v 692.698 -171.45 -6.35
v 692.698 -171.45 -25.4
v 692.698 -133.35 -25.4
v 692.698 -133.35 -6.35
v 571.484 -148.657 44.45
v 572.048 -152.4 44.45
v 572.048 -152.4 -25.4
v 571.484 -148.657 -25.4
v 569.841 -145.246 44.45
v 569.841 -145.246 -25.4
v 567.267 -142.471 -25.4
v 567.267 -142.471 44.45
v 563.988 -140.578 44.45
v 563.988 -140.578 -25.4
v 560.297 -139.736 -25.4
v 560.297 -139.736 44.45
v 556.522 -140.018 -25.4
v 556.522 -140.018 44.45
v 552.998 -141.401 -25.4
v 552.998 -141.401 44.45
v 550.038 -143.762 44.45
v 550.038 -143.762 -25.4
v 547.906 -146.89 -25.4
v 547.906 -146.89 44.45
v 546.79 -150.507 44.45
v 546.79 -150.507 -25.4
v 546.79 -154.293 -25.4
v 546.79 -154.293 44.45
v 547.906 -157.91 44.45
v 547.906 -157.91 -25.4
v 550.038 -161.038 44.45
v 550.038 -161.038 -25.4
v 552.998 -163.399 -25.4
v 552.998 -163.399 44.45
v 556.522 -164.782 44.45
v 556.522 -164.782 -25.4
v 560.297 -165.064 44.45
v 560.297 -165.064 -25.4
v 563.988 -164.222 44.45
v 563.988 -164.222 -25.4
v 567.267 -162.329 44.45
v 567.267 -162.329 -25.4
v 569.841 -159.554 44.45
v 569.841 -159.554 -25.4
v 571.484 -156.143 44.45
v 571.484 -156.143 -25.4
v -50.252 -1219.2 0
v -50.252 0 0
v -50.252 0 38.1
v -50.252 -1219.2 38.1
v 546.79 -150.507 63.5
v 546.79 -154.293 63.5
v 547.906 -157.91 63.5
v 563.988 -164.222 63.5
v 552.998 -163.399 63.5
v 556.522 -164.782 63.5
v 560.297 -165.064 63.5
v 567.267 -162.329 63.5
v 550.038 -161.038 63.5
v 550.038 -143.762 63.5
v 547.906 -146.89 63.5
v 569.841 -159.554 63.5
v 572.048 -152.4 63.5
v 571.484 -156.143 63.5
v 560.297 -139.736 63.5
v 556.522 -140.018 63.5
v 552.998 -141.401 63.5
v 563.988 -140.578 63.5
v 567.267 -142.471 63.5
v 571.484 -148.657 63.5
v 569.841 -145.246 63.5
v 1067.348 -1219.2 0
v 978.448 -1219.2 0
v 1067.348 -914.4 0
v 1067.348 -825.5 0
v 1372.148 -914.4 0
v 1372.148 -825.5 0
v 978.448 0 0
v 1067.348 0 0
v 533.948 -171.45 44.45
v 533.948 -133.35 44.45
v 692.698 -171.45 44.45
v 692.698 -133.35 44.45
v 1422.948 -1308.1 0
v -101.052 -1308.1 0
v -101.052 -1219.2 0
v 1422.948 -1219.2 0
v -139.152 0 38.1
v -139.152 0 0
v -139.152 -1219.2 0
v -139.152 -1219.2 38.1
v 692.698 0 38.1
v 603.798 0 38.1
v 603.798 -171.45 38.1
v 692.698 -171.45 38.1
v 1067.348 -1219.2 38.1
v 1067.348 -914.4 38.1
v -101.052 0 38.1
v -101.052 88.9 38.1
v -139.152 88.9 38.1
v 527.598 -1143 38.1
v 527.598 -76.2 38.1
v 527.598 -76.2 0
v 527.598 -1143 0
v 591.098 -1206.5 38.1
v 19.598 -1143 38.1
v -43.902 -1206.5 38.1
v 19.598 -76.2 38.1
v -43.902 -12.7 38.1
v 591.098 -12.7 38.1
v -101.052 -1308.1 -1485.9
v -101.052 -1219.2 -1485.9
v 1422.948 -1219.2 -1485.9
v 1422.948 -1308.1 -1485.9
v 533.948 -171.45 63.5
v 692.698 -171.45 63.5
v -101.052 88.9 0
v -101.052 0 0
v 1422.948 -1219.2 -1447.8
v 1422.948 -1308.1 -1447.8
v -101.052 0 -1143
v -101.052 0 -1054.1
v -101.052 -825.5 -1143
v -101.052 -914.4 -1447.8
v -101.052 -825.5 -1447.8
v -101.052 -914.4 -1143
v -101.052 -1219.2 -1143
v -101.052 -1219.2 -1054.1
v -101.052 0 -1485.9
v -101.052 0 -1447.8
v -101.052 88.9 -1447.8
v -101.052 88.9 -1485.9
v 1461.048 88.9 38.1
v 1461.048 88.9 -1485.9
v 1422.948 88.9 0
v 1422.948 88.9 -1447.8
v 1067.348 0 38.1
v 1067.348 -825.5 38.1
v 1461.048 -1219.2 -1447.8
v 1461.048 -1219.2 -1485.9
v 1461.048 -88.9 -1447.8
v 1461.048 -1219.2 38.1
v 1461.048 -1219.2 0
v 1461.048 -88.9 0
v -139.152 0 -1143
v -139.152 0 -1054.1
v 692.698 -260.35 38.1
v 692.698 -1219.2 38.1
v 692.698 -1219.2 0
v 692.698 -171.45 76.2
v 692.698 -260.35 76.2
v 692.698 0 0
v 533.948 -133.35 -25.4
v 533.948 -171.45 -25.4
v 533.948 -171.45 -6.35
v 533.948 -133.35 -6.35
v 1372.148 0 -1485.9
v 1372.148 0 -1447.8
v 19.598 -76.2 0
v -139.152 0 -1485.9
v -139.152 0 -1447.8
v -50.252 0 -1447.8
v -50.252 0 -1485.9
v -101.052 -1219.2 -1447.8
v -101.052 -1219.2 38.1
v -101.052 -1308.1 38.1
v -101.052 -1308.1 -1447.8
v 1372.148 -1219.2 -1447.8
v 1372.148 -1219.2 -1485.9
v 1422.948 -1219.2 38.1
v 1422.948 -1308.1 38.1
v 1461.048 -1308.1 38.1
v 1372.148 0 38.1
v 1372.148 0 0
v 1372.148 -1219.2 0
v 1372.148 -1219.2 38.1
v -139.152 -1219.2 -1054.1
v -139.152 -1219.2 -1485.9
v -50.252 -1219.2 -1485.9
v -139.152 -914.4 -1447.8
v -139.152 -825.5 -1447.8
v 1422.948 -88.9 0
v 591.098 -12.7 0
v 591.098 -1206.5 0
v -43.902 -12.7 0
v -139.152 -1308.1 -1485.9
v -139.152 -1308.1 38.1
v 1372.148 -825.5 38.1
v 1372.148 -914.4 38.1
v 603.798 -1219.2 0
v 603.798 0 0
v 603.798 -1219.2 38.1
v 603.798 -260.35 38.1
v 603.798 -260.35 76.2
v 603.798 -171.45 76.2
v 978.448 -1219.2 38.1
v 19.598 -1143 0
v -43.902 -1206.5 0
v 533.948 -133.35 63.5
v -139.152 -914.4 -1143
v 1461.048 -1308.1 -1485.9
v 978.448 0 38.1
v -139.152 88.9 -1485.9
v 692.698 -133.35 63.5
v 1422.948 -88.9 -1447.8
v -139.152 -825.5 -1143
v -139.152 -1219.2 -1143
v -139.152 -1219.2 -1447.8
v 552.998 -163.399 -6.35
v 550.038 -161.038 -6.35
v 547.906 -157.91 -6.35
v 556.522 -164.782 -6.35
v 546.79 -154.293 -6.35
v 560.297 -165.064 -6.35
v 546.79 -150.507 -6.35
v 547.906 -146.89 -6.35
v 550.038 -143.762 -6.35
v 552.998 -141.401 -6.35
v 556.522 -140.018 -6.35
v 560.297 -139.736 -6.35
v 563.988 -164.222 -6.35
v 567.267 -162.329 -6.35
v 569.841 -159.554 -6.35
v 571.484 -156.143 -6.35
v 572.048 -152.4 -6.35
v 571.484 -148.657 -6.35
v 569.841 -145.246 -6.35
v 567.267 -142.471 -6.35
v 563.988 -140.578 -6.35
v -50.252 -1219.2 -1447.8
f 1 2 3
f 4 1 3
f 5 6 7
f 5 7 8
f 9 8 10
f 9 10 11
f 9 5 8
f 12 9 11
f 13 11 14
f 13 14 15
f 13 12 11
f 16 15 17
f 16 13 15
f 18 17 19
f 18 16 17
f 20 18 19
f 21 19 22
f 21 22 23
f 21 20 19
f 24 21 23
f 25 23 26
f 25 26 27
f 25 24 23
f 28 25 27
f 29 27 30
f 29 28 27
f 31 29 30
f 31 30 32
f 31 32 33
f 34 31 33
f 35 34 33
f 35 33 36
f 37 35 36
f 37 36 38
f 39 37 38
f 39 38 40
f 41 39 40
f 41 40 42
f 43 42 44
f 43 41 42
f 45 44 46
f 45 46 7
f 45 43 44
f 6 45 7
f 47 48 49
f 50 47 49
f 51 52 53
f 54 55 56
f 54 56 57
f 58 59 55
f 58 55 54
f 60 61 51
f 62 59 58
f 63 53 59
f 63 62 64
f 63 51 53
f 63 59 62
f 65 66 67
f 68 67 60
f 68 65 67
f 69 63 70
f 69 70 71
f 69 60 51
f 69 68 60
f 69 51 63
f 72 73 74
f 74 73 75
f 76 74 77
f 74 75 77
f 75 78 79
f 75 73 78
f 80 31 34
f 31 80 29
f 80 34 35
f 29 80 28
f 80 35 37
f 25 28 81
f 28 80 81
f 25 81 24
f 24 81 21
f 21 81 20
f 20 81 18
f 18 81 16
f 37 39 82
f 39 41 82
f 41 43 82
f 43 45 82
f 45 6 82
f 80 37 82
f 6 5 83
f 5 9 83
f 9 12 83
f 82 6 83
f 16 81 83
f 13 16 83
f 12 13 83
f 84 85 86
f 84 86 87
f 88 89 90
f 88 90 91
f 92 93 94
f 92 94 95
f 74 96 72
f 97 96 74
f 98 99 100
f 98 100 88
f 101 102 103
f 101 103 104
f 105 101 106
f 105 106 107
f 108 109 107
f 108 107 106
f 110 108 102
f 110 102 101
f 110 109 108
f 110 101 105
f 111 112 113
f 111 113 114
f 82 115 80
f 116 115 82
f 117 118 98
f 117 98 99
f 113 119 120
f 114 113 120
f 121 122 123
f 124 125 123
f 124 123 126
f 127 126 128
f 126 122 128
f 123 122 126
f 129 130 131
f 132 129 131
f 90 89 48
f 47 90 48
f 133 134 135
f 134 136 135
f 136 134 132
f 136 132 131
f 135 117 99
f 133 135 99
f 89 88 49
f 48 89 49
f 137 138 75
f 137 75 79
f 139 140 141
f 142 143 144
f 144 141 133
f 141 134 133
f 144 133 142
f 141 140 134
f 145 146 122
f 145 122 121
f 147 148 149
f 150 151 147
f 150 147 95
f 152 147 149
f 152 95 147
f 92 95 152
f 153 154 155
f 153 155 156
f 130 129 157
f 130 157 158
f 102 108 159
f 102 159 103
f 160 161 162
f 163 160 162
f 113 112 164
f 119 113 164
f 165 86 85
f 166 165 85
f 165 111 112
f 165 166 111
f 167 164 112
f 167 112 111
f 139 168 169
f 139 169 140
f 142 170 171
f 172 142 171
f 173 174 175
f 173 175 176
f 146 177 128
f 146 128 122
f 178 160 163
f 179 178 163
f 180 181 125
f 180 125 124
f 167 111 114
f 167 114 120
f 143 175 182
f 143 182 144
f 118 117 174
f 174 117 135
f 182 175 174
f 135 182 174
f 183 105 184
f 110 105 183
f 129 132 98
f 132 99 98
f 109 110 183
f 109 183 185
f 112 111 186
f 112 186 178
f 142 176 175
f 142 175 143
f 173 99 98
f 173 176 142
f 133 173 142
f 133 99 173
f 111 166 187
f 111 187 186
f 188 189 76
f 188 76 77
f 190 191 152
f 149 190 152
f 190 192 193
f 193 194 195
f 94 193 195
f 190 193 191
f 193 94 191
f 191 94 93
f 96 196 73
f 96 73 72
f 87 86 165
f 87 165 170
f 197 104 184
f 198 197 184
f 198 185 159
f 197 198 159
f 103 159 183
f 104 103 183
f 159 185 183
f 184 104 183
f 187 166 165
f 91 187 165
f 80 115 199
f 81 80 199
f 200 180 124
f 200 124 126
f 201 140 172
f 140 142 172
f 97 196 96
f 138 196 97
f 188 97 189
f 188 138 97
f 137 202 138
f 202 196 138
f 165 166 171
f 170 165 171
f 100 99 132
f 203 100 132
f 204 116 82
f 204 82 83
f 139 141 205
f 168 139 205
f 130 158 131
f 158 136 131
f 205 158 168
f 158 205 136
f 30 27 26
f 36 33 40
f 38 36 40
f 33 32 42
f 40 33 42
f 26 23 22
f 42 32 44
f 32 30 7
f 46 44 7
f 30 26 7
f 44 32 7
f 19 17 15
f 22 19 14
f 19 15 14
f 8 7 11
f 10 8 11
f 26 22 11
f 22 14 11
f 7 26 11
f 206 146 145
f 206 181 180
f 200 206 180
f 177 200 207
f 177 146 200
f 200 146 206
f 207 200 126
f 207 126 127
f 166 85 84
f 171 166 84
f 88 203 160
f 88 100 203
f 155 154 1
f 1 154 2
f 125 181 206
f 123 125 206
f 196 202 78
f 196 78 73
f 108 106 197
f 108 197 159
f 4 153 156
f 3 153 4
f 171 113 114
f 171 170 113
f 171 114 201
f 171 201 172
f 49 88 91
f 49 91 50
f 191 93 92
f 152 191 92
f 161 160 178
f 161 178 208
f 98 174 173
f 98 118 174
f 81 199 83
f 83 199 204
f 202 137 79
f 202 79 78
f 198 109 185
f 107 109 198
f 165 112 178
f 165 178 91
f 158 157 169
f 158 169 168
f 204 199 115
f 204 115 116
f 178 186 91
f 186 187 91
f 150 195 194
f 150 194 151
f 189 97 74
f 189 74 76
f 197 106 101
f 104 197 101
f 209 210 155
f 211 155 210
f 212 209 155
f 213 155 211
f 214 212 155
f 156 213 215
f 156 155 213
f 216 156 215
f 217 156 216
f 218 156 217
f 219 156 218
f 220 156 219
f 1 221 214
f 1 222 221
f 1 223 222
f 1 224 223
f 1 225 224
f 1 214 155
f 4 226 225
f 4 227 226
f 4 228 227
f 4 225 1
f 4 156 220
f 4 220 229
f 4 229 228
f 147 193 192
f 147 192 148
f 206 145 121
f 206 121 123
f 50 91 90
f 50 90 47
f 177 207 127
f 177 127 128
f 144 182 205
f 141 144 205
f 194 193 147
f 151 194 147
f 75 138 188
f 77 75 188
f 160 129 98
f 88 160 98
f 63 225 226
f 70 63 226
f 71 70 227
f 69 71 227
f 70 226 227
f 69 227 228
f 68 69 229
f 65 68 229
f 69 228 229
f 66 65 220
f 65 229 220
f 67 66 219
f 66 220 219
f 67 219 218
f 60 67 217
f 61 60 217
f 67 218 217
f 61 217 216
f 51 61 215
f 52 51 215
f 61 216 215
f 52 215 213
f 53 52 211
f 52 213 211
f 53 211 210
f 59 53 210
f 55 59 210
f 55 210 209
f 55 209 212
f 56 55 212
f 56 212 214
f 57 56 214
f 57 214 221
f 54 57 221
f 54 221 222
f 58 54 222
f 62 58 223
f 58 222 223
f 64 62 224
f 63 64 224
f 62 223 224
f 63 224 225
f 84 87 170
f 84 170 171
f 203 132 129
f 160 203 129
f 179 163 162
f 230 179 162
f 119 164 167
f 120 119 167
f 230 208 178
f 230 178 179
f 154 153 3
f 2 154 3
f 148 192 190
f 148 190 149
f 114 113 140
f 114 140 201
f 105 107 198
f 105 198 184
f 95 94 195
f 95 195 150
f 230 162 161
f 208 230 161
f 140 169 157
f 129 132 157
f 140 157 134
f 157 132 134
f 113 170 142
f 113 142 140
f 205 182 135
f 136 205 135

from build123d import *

# Parameters (mm, degrees)
F0_W           = 1524
F0_H           = 88.9
F1_DEPTH       = 38.1
F2_W           = 88.9
F2_H           = 1485.9
F2_H_2         = 38.1
F3_DEPTH       = 38.1
F4_W           = 88.9
F4_H           = 1485.9
F4_H_2         = 38.1
F5_DEPTH       = 38.1
F6_W           = 88.9
F6_H           = 38.1
F7_DEPTH       = 1524
F8_W           = 88.9
F8_H           = 38.1
F9_DEPTH       = 1219.2
F8_W_2         = 50.8
F8_W_3         = 38.1
F12_DEPTH      = 88.9
F13_W          = 508
F13_H          = 63.5
F14_DEPTH      = 38.1
F15_W          = 88.9
F15_H          = 1219.2
F16_DEPTH      = 38.1
F17_R          = 12.7
F18_DEPTH      = 25.4
F18_DEPTH_BACK = 63.5
F19_W          = 158.75
F19_H          = 38.1
F19_R          = 12.7
F20_DEPTH      = 19.05
F23_W          = 88.9
F23_H          = 88.9
F24_DEPTH      = 38.1
F25_W          = 304.8
F25_H          = 88.9
F26_DEPTH      = 38.1
F27_W          = 88.9
F27_H          = 304.8
F28_DEPTH      = 38.1


with BuildPart() as f1:
    # F0 (on Top) → F1 (new body)
    with BuildSketch(Plane.XY):
        with Locations((660.9481970845, 44.45)):
            Rectangle(F0_W, F0_H)
    extrude(amount=F1_DEPTH)


with BuildPart() as f3:
    # F2 (on face) → F3 (new body)
    with BuildSketch(Plane.YZ.offset(1422.9481970845)):
        with Locations((44.45, -742.95)):
            Rectangle(F2_W, F2_H)
        with Locations((44.45, 19.05)):
            Rectangle(F2_W, F2_H_2)
    extrude(amount=F3_DEPTH)


with BuildPart() as f5:
    # F4 (on face) → F5 (new body)
    with BuildSketch(Plane(origin=(-101.0518029155, 0, 0), x_dir=(0, -1, 0), z_dir=(-1, 0, 0))):
        with Locations((-44.45, -742.95)):
            Rectangle(F4_W, F4_H)
        with Locations((-44.45, 19.05)):
            Rectangle(F4_W, F4_H_2)
    extrude(amount=F5_DEPTH)


with BuildPart() as f7:
    # F6 (on face) → F7 (new body)
    with BuildSketch(Plane.YZ.offset(-101.0518029155)):
        with Locations((44.45, -1466.85)):
            Rectangle(F6_W, F6_H)
    extrude(amount=F7_DEPTH)


with BuildPart() as f9:
    # F8 (on face) → F9 (new body)
    with BuildSketch(Plane.XZ):
        with Locations((-94.7018029155, 19.05)):
            Rectangle(F8_W, F8_H)
    extrude(amount=F9_DEPTH)


with BuildPart() as f9b:
    # F8 (on face) → F9, piece 2 (new body)
    with BuildSketch(Plane.XZ):
        with Locations((1416.5981970845, 19.05)):
            Rectangle(F8_W, F8_H)
    extrude(amount=F9_DEPTH)


with BuildPart() as f9c:
    # F8 (on face) → F9, piece 3 (new body)
    with BuildSketch(Plane.XZ):
        with Locations((1397.5481970845, -1466.85)):
            Rectangle(F8_W_2, F8_H)
        with Locations((1441.9981970845, -1466.85)):
            Rectangle(F8_W_3, F8_H)
    extrude(amount=F9_DEPTH)


with BuildPart() as f9d:
    # F8 (on face) → F9, piece 4 (new body)
    with BuildSketch(Plane.XZ):
        with Locations((-120.1018029155, -1466.85)):
            Rectangle(F8_W_3, F8_H)
        with Locations((-75.6518029155, -1466.85)):
            Rectangle(F8_W_2, F8_H)
    extrude(amount=F9_DEPTH)


with BuildPart() as f11_1:
    # F11: instance of F7
    add(f7.part.mirror(Plane(origin=(1416.5981970845, -609.6, -1466.85), x_dir=(1, 0, 0), z_dir=(0, -1, 0))))


with BuildPart() as f11_2:
    # F11: instance of F5
    add(f5.part.mirror(Plane(origin=(1416.5981970845, -609.6, -1466.85), x_dir=(1, 0, 0), z_dir=(0, -1, 0))))


with BuildPart() as f11_3:
    # F11: instance of F1
    add(f1.part.mirror(Plane(origin=(1416.5981970845, -609.6, -1466.85), x_dir=(1, 0, 0), z_dir=(0, -1, 0))))


with BuildPart() as f11_4:
    # F11: instance of F3
    add(f3.part.mirror(Plane(origin=(1416.5981970845, -609.6, -1466.85), x_dir=(1, 0, 0), z_dir=(0, -1, 0))))


with BuildPart() as f1_1:
    add(f1.part)

    # F12 (add): a face of the model
    f12_faces = [f3.part.faces().sort_by_distance(p)[0] for p in [
        (1441.9981970845, 0, -723.9),
    ]]

    add(f3.part)  # F12 merges F3

    add(f7.part)  # F12 merges F7

    add(f9b.part)  # F12 merges F9b

    add(f9c.part)  # F12 merges F9c
    extrude(f12_faces, amount=F12_DEPTH)


with BuildPart() as f14:
    # F13 (on face) → F14 (new body)
    with BuildSketch(Plane.XY.offset(38.1)):
        Polygon((19.5981970845, -12.7), (-43.9018029155, -12.7), (-43.9018029155, -1206.5), (19.5981970845, -1206.5), (19.5981970845, -1143), (19.5981970845, -76.2), align=None)
        with Locations((273.5981970845, -44.45)):
            Rectangle(F13_W, F13_H)
        Polygon((591.0981970845, -12.7), (527.5981970845, -12.7), (527.5981970845, -76.2), (527.5981970845, -1143), (527.5981970845, -1206.5), (591.0981970845, -1206.5), align=None)
        with Locations((273.5981970845, -1174.75)):
            Rectangle(F13_W, F13_H)
    extrude(amount=-F14_DEPTH)


with BuildPart() as f16:
    # F15 (on face) → F16 (new body)
    with BuildSketch(Plane.XY.offset(38.1)):
        with Locations((648.2481970845, -609.6)):
            Rectangle(F15_W, F15_H)
    extrude(amount=-F16_DEPTH)

    # F23 (on face) → F24 (join)
    with BuildSketch(Plane.XY.offset(38.1)):
        with Locations((648.2481970845, -215.9)):
            Rectangle(F23_W, F23_H)
    extrude(amount=F24_DEPTH)


with BuildPart() as f18:
    # F17 (on face) → F18 (new body, two sides)
    with BuildSketch(Plane.XY.offset(38.1)) as f18_sk:
        with Locations((559.3481970845, -152.4)):
            Circle(F17_R)
    extrude(amount=F18_DEPTH)
    extrude(f18_sk.sketch, amount=-F18_DEPTH_BACK)

    # F19 (on face) → F20 (join)
    with BuildSketch(Plane.XY.offset(63.5)):
        with Locations((613.3231970845, -152.4)):
            Rectangle(F19_W, F19_H)
        with Locations((559.3481970845, -152.4)):
            Circle(F19_R, mode=Mode.SUBTRACT)
    extrude(amount=-F20_DEPTH)


with BuildPart() as f22_1:
    # F22: instance of F18
    add(f18.part.mirror(Plane(origin=(648.2481970845, -609.6, 19.05), x_dir=(1, 0, 0), z_dir=(0, 0, 1))))


with BuildPart() as f26:
    # F25 (on face) → F26 (new body)
    with BuildSketch(Plane.XY.offset(38.1)):
        with Locations((1219.7481970845, -869.95)):
            Rectangle(F25_W, F25_H)
        Polygon((1067.3481970845, -825.5), (1067.3481970845, 0), (978.4481970845, 0), (978.4481970845, -1219.2), (1067.3481970845, -1219.2), (1067.3481970845, -914.4), align=None)
    extrude(amount=-F26_DEPTH)


with BuildPart() as f28:
    # F27 (on face) → F28 (new body)
    with BuildSketch(Plane(origin=(-139.1518029155, 0, 0), x_dir=(0, -1, 0), z_dir=(-1, 0, 0))):
        Polygon((1219.2, -1143), (1219.2, -1054.1), (0, -1054.1), (0, -1143), (825.5, -1143), (914.4, -1143), align=None)
        with Locations((869.95, -1295.4)):
            Rectangle(F27_W, F27_H)
    extrude(amount=-F28_DEPTH)


solid = Compound([f5.part, f9.part, f9d.part, f11_1.part, f11_2.part, f11_3.part, f11_4.part, f1_1.part, f14.part, f16.part, f18.part, f22_1.part, f26.part, f28.part])
